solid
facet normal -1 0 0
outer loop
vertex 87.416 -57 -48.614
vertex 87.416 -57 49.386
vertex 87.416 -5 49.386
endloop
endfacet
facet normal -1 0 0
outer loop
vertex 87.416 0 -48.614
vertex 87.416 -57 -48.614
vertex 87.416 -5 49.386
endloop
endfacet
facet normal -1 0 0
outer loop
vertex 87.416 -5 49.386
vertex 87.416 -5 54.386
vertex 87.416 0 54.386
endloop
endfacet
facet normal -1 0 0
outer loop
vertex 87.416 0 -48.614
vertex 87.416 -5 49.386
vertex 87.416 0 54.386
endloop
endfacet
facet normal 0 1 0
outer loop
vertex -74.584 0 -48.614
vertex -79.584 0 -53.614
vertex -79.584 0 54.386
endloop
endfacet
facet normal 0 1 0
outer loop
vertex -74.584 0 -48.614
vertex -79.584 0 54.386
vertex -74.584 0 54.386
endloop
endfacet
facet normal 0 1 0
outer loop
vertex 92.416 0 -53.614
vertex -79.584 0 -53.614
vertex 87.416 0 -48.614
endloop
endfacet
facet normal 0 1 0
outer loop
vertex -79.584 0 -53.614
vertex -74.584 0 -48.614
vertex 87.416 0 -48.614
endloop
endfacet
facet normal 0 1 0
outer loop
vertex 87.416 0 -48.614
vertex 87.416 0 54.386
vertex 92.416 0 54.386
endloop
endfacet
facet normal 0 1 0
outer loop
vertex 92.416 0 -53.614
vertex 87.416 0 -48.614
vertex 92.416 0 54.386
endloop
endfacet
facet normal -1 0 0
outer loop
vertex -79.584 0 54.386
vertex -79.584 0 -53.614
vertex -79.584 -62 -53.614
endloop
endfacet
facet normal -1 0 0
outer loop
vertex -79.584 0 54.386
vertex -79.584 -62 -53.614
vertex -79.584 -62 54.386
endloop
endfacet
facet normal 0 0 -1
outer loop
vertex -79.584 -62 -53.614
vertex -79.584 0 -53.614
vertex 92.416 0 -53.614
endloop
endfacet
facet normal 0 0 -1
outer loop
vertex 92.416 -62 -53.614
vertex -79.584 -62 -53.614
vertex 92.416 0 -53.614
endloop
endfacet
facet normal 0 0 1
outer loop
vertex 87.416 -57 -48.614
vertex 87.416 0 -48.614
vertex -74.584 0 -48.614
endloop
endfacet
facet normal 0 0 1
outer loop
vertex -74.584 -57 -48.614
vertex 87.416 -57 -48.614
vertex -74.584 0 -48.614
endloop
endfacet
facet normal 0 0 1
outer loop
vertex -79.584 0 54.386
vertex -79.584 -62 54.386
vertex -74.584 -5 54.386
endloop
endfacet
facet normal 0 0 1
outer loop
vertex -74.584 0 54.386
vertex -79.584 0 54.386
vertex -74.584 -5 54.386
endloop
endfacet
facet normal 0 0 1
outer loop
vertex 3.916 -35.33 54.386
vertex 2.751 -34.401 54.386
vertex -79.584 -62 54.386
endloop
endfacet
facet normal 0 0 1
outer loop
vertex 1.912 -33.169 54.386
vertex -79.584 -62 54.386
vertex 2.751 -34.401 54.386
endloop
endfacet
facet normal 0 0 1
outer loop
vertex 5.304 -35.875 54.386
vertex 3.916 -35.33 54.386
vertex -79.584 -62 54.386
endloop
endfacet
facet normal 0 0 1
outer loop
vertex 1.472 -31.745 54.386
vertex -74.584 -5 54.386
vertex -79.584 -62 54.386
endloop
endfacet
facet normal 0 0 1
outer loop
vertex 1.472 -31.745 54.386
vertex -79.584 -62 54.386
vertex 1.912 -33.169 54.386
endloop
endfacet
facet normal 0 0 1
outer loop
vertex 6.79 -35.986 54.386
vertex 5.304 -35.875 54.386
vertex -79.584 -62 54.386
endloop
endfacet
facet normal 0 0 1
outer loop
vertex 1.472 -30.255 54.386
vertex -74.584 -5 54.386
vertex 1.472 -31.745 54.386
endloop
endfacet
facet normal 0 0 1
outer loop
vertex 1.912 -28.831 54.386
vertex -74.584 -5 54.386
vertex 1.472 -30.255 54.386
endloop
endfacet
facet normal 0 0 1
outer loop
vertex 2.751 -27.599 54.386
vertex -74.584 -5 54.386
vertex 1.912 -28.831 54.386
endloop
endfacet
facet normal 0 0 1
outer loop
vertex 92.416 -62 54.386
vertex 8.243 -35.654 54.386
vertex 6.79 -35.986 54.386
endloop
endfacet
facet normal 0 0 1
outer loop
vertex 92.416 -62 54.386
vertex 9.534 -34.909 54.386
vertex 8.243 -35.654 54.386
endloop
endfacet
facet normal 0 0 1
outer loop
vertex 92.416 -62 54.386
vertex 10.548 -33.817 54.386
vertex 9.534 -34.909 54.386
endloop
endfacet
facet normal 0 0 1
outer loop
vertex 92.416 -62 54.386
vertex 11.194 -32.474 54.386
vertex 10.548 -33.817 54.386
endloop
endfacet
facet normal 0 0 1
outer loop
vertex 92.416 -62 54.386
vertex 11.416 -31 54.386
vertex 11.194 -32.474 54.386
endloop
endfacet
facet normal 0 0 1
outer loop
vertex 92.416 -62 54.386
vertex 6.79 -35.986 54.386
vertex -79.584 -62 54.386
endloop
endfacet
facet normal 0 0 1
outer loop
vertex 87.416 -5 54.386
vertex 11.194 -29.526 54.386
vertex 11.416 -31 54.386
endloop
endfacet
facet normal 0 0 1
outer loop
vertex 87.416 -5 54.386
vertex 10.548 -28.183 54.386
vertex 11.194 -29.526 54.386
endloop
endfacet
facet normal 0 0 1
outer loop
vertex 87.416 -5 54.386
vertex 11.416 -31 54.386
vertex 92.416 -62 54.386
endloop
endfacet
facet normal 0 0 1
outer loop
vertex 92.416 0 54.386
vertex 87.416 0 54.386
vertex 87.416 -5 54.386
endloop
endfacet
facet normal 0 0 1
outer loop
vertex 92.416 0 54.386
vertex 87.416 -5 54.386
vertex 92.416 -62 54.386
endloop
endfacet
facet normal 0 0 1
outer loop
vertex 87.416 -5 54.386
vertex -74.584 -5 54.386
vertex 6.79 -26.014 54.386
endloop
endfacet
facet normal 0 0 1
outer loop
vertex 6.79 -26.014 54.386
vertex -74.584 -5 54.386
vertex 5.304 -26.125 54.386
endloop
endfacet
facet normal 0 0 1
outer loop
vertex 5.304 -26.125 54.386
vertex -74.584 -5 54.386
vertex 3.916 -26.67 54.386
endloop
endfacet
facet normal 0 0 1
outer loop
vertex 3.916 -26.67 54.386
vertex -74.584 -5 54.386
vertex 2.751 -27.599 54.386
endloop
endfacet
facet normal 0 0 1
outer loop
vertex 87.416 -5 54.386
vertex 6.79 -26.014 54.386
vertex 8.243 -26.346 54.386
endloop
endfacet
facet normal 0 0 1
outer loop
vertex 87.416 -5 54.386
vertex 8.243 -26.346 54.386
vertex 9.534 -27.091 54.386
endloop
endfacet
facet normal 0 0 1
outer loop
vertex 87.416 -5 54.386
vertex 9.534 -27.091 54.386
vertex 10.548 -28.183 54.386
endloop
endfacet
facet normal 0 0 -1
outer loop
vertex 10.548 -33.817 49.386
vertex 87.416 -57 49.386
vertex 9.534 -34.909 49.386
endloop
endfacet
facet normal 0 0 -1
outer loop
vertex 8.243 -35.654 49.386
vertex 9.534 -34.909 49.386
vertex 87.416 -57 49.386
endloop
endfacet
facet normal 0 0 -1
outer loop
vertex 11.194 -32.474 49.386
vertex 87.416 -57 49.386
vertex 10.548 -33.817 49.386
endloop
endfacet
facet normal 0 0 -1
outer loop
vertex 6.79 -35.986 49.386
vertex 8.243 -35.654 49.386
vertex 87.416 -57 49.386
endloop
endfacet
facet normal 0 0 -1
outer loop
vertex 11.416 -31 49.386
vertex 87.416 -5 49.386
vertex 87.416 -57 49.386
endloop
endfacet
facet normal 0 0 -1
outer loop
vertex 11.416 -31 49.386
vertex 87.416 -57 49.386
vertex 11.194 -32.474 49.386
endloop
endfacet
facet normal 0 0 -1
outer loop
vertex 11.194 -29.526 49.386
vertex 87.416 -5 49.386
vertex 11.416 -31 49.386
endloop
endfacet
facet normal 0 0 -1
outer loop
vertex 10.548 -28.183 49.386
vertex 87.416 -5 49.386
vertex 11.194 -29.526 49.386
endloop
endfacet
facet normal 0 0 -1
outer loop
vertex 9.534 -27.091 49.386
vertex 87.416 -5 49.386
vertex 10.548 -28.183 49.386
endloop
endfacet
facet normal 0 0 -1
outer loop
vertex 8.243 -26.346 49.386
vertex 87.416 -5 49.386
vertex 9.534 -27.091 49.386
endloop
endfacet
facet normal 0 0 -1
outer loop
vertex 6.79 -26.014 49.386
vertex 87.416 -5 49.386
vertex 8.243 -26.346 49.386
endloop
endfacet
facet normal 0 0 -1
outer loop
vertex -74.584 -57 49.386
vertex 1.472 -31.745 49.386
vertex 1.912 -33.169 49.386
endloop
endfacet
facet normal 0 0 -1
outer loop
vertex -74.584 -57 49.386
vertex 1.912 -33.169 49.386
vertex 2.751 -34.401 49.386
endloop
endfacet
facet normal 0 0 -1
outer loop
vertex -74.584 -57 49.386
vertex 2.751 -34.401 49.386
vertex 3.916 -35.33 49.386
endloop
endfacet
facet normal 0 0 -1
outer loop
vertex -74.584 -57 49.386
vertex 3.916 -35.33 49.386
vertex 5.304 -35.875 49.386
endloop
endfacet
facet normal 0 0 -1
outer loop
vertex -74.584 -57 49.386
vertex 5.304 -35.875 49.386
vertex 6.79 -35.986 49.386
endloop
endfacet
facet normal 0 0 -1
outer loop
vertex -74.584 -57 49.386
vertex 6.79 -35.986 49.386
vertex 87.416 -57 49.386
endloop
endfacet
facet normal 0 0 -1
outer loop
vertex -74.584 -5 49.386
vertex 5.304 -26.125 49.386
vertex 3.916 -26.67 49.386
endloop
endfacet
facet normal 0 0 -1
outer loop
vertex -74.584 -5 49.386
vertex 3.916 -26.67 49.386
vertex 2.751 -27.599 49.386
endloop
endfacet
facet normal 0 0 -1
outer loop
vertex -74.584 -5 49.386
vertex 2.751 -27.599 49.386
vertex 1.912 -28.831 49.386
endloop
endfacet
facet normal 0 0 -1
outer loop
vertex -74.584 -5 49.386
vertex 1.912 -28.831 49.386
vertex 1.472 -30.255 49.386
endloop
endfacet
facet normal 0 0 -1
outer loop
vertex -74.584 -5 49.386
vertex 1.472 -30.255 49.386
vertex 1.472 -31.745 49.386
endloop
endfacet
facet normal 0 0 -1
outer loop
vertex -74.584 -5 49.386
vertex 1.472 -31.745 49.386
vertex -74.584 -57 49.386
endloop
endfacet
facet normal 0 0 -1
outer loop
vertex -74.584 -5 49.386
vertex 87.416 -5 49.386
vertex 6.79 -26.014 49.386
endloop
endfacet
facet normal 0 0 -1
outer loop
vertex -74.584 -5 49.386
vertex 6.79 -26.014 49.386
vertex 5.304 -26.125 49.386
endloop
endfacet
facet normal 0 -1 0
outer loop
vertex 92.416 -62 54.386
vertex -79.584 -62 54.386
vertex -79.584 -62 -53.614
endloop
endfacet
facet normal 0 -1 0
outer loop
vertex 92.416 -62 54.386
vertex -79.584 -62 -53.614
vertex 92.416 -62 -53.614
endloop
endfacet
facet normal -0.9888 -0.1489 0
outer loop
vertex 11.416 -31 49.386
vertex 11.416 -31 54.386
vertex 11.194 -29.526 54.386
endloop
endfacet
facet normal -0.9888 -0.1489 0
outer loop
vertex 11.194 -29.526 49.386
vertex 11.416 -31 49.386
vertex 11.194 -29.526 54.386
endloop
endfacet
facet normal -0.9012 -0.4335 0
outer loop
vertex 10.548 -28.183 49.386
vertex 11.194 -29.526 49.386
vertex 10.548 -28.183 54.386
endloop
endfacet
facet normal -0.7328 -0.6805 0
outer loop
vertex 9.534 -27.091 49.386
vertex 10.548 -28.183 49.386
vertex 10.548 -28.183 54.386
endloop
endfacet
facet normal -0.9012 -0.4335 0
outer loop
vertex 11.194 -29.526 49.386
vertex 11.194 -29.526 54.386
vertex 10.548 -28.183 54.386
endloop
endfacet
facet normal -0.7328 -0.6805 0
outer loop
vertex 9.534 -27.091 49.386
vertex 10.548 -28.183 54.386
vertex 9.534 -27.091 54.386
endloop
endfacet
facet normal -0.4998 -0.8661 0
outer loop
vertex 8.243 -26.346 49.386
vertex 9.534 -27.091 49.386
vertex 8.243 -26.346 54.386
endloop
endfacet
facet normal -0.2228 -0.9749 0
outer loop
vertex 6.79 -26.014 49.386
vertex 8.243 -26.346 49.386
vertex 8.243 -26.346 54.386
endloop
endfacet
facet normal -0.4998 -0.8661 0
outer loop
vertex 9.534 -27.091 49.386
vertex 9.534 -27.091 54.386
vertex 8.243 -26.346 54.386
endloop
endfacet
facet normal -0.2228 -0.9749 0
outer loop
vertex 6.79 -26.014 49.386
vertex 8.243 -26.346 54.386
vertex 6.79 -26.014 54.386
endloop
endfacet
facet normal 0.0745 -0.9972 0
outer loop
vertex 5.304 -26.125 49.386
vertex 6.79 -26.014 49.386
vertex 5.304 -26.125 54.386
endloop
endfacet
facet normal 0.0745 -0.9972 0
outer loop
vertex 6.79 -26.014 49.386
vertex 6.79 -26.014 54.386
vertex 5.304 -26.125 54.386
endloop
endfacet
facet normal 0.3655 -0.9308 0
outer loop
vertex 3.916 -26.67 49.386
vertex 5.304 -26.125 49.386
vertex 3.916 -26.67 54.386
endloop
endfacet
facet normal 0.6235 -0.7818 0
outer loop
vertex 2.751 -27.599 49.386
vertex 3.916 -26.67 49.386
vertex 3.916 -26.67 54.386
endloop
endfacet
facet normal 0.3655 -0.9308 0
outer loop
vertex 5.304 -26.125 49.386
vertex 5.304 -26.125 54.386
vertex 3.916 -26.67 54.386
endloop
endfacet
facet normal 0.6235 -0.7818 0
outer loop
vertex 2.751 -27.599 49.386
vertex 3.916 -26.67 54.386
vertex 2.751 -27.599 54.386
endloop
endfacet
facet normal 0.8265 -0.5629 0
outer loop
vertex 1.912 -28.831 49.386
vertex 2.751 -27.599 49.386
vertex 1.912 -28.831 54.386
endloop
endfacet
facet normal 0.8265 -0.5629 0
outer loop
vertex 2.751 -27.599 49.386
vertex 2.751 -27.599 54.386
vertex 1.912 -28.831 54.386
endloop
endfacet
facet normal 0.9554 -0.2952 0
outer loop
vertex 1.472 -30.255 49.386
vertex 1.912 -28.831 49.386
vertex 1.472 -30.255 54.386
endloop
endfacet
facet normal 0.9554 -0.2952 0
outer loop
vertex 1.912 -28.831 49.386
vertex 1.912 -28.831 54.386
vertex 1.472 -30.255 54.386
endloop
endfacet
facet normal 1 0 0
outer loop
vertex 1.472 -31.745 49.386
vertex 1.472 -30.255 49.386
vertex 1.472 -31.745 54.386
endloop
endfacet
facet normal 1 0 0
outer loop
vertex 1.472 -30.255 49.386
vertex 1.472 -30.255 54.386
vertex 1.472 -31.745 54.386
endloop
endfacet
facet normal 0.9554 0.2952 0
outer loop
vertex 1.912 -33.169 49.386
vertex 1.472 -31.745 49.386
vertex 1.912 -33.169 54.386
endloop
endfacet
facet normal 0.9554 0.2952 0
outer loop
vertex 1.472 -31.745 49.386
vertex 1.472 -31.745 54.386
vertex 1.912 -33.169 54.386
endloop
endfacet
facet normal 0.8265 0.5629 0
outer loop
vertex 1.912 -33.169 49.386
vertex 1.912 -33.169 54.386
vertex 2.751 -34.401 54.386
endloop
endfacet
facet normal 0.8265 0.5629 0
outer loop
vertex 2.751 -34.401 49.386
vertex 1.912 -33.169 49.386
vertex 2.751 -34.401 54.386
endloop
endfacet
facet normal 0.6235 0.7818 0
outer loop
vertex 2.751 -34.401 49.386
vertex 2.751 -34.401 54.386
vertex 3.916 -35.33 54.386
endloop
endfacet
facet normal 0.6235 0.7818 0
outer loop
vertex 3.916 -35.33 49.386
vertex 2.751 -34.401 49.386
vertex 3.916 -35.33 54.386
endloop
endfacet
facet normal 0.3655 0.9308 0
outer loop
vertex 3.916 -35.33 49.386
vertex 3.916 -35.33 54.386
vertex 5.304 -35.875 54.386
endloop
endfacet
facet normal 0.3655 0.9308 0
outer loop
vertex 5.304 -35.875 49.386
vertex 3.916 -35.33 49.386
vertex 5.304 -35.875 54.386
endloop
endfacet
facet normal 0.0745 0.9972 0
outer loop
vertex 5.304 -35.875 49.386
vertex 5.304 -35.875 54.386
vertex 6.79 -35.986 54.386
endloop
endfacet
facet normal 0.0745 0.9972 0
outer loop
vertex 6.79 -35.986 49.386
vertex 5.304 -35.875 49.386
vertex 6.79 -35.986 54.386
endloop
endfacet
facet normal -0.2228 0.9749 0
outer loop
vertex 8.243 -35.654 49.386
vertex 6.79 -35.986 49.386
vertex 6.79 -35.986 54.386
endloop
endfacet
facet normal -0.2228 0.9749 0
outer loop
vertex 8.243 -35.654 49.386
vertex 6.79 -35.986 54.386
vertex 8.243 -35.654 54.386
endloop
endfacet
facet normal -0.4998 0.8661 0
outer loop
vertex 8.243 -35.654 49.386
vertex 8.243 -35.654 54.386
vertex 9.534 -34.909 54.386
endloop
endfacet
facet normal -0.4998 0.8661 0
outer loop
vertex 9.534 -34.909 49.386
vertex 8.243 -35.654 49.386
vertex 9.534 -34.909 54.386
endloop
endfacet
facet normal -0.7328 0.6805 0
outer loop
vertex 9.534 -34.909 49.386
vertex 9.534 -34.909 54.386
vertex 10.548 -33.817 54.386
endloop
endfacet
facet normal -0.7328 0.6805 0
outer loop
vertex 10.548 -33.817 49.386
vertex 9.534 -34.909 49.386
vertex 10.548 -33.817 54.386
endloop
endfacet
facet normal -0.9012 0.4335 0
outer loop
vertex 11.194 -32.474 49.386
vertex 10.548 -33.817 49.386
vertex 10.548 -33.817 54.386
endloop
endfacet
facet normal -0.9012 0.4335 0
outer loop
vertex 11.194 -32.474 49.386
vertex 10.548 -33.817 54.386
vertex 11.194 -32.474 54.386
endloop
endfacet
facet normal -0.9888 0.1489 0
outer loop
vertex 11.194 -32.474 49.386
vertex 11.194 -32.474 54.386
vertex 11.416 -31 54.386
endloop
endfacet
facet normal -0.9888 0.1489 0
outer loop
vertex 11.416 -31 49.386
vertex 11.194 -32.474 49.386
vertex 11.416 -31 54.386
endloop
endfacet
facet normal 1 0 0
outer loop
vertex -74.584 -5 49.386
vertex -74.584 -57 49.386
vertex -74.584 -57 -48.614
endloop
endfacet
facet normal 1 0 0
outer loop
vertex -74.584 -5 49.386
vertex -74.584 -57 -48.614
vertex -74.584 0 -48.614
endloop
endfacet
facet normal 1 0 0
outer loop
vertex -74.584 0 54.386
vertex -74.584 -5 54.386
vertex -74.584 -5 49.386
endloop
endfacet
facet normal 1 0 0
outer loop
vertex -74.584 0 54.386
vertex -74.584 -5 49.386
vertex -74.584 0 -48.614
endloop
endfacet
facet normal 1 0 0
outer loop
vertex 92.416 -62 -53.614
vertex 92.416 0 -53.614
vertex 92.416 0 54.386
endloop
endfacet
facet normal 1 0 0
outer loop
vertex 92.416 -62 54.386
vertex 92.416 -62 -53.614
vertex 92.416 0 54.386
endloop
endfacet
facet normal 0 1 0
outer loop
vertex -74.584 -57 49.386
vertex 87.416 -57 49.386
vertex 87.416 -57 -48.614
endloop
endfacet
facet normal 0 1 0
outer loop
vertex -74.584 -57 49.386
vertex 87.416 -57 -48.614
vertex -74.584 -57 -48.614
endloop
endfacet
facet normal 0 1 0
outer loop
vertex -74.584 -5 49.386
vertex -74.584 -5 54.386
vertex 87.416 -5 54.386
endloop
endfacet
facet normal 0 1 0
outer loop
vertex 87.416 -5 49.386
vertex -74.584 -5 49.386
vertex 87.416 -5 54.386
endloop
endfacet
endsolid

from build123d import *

# Parameters (mm, degrees)
F0_W     = 172
F0_H     = 108
F1_DEPTH = 62
F3_W     = 162
F3_H     = 98
F4_DEPTH = 57
F2_R     = 5
F5_DEPTH = 25
F6_W     = 162
F6_H     = 5
F7_DEPTH = 25


with BuildPart() as f1:
    # F0 (on Front) → F1 (new body)
    with BuildSketch(Plane.XZ):
        with Locations((6.416367, 0.38575)):
            Rectangle(F0_W, F0_H)
    extrude(amount=F1_DEPTH)

    # F3 (on face) → F4 (cut)
    with BuildSketch(Plane(origin=(0, 0, 0), x_dir=(-1, 0, 0), z_dir=(0, 1, 0))):
        with Locations((-6.416367, 0.38575)):
            Rectangle(F3_W, F3_H)
    extrude(amount=-F4_DEPTH, mode=Mode.SUBTRACT)

    # F2 (on face) → F5 (cut)
    with BuildSketch(Plane.XY.offset(54.38575)):
        with Locations((6.416367, -31)):
            Circle(F2_R)
    extrude(amount=-F5_DEPTH, mode=Mode.SUBTRACT)

    # F6 (on face) → F7 (cut)
    with BuildSketch(Plane.XY.offset(54.38575)):
        with Locations((6.416367, -2.5)):
            Rectangle(F6_W, F6_H)
    extrude(amount=-F7_DEPTH, mode=Mode.SUBTRACT)


solid = f1.part
